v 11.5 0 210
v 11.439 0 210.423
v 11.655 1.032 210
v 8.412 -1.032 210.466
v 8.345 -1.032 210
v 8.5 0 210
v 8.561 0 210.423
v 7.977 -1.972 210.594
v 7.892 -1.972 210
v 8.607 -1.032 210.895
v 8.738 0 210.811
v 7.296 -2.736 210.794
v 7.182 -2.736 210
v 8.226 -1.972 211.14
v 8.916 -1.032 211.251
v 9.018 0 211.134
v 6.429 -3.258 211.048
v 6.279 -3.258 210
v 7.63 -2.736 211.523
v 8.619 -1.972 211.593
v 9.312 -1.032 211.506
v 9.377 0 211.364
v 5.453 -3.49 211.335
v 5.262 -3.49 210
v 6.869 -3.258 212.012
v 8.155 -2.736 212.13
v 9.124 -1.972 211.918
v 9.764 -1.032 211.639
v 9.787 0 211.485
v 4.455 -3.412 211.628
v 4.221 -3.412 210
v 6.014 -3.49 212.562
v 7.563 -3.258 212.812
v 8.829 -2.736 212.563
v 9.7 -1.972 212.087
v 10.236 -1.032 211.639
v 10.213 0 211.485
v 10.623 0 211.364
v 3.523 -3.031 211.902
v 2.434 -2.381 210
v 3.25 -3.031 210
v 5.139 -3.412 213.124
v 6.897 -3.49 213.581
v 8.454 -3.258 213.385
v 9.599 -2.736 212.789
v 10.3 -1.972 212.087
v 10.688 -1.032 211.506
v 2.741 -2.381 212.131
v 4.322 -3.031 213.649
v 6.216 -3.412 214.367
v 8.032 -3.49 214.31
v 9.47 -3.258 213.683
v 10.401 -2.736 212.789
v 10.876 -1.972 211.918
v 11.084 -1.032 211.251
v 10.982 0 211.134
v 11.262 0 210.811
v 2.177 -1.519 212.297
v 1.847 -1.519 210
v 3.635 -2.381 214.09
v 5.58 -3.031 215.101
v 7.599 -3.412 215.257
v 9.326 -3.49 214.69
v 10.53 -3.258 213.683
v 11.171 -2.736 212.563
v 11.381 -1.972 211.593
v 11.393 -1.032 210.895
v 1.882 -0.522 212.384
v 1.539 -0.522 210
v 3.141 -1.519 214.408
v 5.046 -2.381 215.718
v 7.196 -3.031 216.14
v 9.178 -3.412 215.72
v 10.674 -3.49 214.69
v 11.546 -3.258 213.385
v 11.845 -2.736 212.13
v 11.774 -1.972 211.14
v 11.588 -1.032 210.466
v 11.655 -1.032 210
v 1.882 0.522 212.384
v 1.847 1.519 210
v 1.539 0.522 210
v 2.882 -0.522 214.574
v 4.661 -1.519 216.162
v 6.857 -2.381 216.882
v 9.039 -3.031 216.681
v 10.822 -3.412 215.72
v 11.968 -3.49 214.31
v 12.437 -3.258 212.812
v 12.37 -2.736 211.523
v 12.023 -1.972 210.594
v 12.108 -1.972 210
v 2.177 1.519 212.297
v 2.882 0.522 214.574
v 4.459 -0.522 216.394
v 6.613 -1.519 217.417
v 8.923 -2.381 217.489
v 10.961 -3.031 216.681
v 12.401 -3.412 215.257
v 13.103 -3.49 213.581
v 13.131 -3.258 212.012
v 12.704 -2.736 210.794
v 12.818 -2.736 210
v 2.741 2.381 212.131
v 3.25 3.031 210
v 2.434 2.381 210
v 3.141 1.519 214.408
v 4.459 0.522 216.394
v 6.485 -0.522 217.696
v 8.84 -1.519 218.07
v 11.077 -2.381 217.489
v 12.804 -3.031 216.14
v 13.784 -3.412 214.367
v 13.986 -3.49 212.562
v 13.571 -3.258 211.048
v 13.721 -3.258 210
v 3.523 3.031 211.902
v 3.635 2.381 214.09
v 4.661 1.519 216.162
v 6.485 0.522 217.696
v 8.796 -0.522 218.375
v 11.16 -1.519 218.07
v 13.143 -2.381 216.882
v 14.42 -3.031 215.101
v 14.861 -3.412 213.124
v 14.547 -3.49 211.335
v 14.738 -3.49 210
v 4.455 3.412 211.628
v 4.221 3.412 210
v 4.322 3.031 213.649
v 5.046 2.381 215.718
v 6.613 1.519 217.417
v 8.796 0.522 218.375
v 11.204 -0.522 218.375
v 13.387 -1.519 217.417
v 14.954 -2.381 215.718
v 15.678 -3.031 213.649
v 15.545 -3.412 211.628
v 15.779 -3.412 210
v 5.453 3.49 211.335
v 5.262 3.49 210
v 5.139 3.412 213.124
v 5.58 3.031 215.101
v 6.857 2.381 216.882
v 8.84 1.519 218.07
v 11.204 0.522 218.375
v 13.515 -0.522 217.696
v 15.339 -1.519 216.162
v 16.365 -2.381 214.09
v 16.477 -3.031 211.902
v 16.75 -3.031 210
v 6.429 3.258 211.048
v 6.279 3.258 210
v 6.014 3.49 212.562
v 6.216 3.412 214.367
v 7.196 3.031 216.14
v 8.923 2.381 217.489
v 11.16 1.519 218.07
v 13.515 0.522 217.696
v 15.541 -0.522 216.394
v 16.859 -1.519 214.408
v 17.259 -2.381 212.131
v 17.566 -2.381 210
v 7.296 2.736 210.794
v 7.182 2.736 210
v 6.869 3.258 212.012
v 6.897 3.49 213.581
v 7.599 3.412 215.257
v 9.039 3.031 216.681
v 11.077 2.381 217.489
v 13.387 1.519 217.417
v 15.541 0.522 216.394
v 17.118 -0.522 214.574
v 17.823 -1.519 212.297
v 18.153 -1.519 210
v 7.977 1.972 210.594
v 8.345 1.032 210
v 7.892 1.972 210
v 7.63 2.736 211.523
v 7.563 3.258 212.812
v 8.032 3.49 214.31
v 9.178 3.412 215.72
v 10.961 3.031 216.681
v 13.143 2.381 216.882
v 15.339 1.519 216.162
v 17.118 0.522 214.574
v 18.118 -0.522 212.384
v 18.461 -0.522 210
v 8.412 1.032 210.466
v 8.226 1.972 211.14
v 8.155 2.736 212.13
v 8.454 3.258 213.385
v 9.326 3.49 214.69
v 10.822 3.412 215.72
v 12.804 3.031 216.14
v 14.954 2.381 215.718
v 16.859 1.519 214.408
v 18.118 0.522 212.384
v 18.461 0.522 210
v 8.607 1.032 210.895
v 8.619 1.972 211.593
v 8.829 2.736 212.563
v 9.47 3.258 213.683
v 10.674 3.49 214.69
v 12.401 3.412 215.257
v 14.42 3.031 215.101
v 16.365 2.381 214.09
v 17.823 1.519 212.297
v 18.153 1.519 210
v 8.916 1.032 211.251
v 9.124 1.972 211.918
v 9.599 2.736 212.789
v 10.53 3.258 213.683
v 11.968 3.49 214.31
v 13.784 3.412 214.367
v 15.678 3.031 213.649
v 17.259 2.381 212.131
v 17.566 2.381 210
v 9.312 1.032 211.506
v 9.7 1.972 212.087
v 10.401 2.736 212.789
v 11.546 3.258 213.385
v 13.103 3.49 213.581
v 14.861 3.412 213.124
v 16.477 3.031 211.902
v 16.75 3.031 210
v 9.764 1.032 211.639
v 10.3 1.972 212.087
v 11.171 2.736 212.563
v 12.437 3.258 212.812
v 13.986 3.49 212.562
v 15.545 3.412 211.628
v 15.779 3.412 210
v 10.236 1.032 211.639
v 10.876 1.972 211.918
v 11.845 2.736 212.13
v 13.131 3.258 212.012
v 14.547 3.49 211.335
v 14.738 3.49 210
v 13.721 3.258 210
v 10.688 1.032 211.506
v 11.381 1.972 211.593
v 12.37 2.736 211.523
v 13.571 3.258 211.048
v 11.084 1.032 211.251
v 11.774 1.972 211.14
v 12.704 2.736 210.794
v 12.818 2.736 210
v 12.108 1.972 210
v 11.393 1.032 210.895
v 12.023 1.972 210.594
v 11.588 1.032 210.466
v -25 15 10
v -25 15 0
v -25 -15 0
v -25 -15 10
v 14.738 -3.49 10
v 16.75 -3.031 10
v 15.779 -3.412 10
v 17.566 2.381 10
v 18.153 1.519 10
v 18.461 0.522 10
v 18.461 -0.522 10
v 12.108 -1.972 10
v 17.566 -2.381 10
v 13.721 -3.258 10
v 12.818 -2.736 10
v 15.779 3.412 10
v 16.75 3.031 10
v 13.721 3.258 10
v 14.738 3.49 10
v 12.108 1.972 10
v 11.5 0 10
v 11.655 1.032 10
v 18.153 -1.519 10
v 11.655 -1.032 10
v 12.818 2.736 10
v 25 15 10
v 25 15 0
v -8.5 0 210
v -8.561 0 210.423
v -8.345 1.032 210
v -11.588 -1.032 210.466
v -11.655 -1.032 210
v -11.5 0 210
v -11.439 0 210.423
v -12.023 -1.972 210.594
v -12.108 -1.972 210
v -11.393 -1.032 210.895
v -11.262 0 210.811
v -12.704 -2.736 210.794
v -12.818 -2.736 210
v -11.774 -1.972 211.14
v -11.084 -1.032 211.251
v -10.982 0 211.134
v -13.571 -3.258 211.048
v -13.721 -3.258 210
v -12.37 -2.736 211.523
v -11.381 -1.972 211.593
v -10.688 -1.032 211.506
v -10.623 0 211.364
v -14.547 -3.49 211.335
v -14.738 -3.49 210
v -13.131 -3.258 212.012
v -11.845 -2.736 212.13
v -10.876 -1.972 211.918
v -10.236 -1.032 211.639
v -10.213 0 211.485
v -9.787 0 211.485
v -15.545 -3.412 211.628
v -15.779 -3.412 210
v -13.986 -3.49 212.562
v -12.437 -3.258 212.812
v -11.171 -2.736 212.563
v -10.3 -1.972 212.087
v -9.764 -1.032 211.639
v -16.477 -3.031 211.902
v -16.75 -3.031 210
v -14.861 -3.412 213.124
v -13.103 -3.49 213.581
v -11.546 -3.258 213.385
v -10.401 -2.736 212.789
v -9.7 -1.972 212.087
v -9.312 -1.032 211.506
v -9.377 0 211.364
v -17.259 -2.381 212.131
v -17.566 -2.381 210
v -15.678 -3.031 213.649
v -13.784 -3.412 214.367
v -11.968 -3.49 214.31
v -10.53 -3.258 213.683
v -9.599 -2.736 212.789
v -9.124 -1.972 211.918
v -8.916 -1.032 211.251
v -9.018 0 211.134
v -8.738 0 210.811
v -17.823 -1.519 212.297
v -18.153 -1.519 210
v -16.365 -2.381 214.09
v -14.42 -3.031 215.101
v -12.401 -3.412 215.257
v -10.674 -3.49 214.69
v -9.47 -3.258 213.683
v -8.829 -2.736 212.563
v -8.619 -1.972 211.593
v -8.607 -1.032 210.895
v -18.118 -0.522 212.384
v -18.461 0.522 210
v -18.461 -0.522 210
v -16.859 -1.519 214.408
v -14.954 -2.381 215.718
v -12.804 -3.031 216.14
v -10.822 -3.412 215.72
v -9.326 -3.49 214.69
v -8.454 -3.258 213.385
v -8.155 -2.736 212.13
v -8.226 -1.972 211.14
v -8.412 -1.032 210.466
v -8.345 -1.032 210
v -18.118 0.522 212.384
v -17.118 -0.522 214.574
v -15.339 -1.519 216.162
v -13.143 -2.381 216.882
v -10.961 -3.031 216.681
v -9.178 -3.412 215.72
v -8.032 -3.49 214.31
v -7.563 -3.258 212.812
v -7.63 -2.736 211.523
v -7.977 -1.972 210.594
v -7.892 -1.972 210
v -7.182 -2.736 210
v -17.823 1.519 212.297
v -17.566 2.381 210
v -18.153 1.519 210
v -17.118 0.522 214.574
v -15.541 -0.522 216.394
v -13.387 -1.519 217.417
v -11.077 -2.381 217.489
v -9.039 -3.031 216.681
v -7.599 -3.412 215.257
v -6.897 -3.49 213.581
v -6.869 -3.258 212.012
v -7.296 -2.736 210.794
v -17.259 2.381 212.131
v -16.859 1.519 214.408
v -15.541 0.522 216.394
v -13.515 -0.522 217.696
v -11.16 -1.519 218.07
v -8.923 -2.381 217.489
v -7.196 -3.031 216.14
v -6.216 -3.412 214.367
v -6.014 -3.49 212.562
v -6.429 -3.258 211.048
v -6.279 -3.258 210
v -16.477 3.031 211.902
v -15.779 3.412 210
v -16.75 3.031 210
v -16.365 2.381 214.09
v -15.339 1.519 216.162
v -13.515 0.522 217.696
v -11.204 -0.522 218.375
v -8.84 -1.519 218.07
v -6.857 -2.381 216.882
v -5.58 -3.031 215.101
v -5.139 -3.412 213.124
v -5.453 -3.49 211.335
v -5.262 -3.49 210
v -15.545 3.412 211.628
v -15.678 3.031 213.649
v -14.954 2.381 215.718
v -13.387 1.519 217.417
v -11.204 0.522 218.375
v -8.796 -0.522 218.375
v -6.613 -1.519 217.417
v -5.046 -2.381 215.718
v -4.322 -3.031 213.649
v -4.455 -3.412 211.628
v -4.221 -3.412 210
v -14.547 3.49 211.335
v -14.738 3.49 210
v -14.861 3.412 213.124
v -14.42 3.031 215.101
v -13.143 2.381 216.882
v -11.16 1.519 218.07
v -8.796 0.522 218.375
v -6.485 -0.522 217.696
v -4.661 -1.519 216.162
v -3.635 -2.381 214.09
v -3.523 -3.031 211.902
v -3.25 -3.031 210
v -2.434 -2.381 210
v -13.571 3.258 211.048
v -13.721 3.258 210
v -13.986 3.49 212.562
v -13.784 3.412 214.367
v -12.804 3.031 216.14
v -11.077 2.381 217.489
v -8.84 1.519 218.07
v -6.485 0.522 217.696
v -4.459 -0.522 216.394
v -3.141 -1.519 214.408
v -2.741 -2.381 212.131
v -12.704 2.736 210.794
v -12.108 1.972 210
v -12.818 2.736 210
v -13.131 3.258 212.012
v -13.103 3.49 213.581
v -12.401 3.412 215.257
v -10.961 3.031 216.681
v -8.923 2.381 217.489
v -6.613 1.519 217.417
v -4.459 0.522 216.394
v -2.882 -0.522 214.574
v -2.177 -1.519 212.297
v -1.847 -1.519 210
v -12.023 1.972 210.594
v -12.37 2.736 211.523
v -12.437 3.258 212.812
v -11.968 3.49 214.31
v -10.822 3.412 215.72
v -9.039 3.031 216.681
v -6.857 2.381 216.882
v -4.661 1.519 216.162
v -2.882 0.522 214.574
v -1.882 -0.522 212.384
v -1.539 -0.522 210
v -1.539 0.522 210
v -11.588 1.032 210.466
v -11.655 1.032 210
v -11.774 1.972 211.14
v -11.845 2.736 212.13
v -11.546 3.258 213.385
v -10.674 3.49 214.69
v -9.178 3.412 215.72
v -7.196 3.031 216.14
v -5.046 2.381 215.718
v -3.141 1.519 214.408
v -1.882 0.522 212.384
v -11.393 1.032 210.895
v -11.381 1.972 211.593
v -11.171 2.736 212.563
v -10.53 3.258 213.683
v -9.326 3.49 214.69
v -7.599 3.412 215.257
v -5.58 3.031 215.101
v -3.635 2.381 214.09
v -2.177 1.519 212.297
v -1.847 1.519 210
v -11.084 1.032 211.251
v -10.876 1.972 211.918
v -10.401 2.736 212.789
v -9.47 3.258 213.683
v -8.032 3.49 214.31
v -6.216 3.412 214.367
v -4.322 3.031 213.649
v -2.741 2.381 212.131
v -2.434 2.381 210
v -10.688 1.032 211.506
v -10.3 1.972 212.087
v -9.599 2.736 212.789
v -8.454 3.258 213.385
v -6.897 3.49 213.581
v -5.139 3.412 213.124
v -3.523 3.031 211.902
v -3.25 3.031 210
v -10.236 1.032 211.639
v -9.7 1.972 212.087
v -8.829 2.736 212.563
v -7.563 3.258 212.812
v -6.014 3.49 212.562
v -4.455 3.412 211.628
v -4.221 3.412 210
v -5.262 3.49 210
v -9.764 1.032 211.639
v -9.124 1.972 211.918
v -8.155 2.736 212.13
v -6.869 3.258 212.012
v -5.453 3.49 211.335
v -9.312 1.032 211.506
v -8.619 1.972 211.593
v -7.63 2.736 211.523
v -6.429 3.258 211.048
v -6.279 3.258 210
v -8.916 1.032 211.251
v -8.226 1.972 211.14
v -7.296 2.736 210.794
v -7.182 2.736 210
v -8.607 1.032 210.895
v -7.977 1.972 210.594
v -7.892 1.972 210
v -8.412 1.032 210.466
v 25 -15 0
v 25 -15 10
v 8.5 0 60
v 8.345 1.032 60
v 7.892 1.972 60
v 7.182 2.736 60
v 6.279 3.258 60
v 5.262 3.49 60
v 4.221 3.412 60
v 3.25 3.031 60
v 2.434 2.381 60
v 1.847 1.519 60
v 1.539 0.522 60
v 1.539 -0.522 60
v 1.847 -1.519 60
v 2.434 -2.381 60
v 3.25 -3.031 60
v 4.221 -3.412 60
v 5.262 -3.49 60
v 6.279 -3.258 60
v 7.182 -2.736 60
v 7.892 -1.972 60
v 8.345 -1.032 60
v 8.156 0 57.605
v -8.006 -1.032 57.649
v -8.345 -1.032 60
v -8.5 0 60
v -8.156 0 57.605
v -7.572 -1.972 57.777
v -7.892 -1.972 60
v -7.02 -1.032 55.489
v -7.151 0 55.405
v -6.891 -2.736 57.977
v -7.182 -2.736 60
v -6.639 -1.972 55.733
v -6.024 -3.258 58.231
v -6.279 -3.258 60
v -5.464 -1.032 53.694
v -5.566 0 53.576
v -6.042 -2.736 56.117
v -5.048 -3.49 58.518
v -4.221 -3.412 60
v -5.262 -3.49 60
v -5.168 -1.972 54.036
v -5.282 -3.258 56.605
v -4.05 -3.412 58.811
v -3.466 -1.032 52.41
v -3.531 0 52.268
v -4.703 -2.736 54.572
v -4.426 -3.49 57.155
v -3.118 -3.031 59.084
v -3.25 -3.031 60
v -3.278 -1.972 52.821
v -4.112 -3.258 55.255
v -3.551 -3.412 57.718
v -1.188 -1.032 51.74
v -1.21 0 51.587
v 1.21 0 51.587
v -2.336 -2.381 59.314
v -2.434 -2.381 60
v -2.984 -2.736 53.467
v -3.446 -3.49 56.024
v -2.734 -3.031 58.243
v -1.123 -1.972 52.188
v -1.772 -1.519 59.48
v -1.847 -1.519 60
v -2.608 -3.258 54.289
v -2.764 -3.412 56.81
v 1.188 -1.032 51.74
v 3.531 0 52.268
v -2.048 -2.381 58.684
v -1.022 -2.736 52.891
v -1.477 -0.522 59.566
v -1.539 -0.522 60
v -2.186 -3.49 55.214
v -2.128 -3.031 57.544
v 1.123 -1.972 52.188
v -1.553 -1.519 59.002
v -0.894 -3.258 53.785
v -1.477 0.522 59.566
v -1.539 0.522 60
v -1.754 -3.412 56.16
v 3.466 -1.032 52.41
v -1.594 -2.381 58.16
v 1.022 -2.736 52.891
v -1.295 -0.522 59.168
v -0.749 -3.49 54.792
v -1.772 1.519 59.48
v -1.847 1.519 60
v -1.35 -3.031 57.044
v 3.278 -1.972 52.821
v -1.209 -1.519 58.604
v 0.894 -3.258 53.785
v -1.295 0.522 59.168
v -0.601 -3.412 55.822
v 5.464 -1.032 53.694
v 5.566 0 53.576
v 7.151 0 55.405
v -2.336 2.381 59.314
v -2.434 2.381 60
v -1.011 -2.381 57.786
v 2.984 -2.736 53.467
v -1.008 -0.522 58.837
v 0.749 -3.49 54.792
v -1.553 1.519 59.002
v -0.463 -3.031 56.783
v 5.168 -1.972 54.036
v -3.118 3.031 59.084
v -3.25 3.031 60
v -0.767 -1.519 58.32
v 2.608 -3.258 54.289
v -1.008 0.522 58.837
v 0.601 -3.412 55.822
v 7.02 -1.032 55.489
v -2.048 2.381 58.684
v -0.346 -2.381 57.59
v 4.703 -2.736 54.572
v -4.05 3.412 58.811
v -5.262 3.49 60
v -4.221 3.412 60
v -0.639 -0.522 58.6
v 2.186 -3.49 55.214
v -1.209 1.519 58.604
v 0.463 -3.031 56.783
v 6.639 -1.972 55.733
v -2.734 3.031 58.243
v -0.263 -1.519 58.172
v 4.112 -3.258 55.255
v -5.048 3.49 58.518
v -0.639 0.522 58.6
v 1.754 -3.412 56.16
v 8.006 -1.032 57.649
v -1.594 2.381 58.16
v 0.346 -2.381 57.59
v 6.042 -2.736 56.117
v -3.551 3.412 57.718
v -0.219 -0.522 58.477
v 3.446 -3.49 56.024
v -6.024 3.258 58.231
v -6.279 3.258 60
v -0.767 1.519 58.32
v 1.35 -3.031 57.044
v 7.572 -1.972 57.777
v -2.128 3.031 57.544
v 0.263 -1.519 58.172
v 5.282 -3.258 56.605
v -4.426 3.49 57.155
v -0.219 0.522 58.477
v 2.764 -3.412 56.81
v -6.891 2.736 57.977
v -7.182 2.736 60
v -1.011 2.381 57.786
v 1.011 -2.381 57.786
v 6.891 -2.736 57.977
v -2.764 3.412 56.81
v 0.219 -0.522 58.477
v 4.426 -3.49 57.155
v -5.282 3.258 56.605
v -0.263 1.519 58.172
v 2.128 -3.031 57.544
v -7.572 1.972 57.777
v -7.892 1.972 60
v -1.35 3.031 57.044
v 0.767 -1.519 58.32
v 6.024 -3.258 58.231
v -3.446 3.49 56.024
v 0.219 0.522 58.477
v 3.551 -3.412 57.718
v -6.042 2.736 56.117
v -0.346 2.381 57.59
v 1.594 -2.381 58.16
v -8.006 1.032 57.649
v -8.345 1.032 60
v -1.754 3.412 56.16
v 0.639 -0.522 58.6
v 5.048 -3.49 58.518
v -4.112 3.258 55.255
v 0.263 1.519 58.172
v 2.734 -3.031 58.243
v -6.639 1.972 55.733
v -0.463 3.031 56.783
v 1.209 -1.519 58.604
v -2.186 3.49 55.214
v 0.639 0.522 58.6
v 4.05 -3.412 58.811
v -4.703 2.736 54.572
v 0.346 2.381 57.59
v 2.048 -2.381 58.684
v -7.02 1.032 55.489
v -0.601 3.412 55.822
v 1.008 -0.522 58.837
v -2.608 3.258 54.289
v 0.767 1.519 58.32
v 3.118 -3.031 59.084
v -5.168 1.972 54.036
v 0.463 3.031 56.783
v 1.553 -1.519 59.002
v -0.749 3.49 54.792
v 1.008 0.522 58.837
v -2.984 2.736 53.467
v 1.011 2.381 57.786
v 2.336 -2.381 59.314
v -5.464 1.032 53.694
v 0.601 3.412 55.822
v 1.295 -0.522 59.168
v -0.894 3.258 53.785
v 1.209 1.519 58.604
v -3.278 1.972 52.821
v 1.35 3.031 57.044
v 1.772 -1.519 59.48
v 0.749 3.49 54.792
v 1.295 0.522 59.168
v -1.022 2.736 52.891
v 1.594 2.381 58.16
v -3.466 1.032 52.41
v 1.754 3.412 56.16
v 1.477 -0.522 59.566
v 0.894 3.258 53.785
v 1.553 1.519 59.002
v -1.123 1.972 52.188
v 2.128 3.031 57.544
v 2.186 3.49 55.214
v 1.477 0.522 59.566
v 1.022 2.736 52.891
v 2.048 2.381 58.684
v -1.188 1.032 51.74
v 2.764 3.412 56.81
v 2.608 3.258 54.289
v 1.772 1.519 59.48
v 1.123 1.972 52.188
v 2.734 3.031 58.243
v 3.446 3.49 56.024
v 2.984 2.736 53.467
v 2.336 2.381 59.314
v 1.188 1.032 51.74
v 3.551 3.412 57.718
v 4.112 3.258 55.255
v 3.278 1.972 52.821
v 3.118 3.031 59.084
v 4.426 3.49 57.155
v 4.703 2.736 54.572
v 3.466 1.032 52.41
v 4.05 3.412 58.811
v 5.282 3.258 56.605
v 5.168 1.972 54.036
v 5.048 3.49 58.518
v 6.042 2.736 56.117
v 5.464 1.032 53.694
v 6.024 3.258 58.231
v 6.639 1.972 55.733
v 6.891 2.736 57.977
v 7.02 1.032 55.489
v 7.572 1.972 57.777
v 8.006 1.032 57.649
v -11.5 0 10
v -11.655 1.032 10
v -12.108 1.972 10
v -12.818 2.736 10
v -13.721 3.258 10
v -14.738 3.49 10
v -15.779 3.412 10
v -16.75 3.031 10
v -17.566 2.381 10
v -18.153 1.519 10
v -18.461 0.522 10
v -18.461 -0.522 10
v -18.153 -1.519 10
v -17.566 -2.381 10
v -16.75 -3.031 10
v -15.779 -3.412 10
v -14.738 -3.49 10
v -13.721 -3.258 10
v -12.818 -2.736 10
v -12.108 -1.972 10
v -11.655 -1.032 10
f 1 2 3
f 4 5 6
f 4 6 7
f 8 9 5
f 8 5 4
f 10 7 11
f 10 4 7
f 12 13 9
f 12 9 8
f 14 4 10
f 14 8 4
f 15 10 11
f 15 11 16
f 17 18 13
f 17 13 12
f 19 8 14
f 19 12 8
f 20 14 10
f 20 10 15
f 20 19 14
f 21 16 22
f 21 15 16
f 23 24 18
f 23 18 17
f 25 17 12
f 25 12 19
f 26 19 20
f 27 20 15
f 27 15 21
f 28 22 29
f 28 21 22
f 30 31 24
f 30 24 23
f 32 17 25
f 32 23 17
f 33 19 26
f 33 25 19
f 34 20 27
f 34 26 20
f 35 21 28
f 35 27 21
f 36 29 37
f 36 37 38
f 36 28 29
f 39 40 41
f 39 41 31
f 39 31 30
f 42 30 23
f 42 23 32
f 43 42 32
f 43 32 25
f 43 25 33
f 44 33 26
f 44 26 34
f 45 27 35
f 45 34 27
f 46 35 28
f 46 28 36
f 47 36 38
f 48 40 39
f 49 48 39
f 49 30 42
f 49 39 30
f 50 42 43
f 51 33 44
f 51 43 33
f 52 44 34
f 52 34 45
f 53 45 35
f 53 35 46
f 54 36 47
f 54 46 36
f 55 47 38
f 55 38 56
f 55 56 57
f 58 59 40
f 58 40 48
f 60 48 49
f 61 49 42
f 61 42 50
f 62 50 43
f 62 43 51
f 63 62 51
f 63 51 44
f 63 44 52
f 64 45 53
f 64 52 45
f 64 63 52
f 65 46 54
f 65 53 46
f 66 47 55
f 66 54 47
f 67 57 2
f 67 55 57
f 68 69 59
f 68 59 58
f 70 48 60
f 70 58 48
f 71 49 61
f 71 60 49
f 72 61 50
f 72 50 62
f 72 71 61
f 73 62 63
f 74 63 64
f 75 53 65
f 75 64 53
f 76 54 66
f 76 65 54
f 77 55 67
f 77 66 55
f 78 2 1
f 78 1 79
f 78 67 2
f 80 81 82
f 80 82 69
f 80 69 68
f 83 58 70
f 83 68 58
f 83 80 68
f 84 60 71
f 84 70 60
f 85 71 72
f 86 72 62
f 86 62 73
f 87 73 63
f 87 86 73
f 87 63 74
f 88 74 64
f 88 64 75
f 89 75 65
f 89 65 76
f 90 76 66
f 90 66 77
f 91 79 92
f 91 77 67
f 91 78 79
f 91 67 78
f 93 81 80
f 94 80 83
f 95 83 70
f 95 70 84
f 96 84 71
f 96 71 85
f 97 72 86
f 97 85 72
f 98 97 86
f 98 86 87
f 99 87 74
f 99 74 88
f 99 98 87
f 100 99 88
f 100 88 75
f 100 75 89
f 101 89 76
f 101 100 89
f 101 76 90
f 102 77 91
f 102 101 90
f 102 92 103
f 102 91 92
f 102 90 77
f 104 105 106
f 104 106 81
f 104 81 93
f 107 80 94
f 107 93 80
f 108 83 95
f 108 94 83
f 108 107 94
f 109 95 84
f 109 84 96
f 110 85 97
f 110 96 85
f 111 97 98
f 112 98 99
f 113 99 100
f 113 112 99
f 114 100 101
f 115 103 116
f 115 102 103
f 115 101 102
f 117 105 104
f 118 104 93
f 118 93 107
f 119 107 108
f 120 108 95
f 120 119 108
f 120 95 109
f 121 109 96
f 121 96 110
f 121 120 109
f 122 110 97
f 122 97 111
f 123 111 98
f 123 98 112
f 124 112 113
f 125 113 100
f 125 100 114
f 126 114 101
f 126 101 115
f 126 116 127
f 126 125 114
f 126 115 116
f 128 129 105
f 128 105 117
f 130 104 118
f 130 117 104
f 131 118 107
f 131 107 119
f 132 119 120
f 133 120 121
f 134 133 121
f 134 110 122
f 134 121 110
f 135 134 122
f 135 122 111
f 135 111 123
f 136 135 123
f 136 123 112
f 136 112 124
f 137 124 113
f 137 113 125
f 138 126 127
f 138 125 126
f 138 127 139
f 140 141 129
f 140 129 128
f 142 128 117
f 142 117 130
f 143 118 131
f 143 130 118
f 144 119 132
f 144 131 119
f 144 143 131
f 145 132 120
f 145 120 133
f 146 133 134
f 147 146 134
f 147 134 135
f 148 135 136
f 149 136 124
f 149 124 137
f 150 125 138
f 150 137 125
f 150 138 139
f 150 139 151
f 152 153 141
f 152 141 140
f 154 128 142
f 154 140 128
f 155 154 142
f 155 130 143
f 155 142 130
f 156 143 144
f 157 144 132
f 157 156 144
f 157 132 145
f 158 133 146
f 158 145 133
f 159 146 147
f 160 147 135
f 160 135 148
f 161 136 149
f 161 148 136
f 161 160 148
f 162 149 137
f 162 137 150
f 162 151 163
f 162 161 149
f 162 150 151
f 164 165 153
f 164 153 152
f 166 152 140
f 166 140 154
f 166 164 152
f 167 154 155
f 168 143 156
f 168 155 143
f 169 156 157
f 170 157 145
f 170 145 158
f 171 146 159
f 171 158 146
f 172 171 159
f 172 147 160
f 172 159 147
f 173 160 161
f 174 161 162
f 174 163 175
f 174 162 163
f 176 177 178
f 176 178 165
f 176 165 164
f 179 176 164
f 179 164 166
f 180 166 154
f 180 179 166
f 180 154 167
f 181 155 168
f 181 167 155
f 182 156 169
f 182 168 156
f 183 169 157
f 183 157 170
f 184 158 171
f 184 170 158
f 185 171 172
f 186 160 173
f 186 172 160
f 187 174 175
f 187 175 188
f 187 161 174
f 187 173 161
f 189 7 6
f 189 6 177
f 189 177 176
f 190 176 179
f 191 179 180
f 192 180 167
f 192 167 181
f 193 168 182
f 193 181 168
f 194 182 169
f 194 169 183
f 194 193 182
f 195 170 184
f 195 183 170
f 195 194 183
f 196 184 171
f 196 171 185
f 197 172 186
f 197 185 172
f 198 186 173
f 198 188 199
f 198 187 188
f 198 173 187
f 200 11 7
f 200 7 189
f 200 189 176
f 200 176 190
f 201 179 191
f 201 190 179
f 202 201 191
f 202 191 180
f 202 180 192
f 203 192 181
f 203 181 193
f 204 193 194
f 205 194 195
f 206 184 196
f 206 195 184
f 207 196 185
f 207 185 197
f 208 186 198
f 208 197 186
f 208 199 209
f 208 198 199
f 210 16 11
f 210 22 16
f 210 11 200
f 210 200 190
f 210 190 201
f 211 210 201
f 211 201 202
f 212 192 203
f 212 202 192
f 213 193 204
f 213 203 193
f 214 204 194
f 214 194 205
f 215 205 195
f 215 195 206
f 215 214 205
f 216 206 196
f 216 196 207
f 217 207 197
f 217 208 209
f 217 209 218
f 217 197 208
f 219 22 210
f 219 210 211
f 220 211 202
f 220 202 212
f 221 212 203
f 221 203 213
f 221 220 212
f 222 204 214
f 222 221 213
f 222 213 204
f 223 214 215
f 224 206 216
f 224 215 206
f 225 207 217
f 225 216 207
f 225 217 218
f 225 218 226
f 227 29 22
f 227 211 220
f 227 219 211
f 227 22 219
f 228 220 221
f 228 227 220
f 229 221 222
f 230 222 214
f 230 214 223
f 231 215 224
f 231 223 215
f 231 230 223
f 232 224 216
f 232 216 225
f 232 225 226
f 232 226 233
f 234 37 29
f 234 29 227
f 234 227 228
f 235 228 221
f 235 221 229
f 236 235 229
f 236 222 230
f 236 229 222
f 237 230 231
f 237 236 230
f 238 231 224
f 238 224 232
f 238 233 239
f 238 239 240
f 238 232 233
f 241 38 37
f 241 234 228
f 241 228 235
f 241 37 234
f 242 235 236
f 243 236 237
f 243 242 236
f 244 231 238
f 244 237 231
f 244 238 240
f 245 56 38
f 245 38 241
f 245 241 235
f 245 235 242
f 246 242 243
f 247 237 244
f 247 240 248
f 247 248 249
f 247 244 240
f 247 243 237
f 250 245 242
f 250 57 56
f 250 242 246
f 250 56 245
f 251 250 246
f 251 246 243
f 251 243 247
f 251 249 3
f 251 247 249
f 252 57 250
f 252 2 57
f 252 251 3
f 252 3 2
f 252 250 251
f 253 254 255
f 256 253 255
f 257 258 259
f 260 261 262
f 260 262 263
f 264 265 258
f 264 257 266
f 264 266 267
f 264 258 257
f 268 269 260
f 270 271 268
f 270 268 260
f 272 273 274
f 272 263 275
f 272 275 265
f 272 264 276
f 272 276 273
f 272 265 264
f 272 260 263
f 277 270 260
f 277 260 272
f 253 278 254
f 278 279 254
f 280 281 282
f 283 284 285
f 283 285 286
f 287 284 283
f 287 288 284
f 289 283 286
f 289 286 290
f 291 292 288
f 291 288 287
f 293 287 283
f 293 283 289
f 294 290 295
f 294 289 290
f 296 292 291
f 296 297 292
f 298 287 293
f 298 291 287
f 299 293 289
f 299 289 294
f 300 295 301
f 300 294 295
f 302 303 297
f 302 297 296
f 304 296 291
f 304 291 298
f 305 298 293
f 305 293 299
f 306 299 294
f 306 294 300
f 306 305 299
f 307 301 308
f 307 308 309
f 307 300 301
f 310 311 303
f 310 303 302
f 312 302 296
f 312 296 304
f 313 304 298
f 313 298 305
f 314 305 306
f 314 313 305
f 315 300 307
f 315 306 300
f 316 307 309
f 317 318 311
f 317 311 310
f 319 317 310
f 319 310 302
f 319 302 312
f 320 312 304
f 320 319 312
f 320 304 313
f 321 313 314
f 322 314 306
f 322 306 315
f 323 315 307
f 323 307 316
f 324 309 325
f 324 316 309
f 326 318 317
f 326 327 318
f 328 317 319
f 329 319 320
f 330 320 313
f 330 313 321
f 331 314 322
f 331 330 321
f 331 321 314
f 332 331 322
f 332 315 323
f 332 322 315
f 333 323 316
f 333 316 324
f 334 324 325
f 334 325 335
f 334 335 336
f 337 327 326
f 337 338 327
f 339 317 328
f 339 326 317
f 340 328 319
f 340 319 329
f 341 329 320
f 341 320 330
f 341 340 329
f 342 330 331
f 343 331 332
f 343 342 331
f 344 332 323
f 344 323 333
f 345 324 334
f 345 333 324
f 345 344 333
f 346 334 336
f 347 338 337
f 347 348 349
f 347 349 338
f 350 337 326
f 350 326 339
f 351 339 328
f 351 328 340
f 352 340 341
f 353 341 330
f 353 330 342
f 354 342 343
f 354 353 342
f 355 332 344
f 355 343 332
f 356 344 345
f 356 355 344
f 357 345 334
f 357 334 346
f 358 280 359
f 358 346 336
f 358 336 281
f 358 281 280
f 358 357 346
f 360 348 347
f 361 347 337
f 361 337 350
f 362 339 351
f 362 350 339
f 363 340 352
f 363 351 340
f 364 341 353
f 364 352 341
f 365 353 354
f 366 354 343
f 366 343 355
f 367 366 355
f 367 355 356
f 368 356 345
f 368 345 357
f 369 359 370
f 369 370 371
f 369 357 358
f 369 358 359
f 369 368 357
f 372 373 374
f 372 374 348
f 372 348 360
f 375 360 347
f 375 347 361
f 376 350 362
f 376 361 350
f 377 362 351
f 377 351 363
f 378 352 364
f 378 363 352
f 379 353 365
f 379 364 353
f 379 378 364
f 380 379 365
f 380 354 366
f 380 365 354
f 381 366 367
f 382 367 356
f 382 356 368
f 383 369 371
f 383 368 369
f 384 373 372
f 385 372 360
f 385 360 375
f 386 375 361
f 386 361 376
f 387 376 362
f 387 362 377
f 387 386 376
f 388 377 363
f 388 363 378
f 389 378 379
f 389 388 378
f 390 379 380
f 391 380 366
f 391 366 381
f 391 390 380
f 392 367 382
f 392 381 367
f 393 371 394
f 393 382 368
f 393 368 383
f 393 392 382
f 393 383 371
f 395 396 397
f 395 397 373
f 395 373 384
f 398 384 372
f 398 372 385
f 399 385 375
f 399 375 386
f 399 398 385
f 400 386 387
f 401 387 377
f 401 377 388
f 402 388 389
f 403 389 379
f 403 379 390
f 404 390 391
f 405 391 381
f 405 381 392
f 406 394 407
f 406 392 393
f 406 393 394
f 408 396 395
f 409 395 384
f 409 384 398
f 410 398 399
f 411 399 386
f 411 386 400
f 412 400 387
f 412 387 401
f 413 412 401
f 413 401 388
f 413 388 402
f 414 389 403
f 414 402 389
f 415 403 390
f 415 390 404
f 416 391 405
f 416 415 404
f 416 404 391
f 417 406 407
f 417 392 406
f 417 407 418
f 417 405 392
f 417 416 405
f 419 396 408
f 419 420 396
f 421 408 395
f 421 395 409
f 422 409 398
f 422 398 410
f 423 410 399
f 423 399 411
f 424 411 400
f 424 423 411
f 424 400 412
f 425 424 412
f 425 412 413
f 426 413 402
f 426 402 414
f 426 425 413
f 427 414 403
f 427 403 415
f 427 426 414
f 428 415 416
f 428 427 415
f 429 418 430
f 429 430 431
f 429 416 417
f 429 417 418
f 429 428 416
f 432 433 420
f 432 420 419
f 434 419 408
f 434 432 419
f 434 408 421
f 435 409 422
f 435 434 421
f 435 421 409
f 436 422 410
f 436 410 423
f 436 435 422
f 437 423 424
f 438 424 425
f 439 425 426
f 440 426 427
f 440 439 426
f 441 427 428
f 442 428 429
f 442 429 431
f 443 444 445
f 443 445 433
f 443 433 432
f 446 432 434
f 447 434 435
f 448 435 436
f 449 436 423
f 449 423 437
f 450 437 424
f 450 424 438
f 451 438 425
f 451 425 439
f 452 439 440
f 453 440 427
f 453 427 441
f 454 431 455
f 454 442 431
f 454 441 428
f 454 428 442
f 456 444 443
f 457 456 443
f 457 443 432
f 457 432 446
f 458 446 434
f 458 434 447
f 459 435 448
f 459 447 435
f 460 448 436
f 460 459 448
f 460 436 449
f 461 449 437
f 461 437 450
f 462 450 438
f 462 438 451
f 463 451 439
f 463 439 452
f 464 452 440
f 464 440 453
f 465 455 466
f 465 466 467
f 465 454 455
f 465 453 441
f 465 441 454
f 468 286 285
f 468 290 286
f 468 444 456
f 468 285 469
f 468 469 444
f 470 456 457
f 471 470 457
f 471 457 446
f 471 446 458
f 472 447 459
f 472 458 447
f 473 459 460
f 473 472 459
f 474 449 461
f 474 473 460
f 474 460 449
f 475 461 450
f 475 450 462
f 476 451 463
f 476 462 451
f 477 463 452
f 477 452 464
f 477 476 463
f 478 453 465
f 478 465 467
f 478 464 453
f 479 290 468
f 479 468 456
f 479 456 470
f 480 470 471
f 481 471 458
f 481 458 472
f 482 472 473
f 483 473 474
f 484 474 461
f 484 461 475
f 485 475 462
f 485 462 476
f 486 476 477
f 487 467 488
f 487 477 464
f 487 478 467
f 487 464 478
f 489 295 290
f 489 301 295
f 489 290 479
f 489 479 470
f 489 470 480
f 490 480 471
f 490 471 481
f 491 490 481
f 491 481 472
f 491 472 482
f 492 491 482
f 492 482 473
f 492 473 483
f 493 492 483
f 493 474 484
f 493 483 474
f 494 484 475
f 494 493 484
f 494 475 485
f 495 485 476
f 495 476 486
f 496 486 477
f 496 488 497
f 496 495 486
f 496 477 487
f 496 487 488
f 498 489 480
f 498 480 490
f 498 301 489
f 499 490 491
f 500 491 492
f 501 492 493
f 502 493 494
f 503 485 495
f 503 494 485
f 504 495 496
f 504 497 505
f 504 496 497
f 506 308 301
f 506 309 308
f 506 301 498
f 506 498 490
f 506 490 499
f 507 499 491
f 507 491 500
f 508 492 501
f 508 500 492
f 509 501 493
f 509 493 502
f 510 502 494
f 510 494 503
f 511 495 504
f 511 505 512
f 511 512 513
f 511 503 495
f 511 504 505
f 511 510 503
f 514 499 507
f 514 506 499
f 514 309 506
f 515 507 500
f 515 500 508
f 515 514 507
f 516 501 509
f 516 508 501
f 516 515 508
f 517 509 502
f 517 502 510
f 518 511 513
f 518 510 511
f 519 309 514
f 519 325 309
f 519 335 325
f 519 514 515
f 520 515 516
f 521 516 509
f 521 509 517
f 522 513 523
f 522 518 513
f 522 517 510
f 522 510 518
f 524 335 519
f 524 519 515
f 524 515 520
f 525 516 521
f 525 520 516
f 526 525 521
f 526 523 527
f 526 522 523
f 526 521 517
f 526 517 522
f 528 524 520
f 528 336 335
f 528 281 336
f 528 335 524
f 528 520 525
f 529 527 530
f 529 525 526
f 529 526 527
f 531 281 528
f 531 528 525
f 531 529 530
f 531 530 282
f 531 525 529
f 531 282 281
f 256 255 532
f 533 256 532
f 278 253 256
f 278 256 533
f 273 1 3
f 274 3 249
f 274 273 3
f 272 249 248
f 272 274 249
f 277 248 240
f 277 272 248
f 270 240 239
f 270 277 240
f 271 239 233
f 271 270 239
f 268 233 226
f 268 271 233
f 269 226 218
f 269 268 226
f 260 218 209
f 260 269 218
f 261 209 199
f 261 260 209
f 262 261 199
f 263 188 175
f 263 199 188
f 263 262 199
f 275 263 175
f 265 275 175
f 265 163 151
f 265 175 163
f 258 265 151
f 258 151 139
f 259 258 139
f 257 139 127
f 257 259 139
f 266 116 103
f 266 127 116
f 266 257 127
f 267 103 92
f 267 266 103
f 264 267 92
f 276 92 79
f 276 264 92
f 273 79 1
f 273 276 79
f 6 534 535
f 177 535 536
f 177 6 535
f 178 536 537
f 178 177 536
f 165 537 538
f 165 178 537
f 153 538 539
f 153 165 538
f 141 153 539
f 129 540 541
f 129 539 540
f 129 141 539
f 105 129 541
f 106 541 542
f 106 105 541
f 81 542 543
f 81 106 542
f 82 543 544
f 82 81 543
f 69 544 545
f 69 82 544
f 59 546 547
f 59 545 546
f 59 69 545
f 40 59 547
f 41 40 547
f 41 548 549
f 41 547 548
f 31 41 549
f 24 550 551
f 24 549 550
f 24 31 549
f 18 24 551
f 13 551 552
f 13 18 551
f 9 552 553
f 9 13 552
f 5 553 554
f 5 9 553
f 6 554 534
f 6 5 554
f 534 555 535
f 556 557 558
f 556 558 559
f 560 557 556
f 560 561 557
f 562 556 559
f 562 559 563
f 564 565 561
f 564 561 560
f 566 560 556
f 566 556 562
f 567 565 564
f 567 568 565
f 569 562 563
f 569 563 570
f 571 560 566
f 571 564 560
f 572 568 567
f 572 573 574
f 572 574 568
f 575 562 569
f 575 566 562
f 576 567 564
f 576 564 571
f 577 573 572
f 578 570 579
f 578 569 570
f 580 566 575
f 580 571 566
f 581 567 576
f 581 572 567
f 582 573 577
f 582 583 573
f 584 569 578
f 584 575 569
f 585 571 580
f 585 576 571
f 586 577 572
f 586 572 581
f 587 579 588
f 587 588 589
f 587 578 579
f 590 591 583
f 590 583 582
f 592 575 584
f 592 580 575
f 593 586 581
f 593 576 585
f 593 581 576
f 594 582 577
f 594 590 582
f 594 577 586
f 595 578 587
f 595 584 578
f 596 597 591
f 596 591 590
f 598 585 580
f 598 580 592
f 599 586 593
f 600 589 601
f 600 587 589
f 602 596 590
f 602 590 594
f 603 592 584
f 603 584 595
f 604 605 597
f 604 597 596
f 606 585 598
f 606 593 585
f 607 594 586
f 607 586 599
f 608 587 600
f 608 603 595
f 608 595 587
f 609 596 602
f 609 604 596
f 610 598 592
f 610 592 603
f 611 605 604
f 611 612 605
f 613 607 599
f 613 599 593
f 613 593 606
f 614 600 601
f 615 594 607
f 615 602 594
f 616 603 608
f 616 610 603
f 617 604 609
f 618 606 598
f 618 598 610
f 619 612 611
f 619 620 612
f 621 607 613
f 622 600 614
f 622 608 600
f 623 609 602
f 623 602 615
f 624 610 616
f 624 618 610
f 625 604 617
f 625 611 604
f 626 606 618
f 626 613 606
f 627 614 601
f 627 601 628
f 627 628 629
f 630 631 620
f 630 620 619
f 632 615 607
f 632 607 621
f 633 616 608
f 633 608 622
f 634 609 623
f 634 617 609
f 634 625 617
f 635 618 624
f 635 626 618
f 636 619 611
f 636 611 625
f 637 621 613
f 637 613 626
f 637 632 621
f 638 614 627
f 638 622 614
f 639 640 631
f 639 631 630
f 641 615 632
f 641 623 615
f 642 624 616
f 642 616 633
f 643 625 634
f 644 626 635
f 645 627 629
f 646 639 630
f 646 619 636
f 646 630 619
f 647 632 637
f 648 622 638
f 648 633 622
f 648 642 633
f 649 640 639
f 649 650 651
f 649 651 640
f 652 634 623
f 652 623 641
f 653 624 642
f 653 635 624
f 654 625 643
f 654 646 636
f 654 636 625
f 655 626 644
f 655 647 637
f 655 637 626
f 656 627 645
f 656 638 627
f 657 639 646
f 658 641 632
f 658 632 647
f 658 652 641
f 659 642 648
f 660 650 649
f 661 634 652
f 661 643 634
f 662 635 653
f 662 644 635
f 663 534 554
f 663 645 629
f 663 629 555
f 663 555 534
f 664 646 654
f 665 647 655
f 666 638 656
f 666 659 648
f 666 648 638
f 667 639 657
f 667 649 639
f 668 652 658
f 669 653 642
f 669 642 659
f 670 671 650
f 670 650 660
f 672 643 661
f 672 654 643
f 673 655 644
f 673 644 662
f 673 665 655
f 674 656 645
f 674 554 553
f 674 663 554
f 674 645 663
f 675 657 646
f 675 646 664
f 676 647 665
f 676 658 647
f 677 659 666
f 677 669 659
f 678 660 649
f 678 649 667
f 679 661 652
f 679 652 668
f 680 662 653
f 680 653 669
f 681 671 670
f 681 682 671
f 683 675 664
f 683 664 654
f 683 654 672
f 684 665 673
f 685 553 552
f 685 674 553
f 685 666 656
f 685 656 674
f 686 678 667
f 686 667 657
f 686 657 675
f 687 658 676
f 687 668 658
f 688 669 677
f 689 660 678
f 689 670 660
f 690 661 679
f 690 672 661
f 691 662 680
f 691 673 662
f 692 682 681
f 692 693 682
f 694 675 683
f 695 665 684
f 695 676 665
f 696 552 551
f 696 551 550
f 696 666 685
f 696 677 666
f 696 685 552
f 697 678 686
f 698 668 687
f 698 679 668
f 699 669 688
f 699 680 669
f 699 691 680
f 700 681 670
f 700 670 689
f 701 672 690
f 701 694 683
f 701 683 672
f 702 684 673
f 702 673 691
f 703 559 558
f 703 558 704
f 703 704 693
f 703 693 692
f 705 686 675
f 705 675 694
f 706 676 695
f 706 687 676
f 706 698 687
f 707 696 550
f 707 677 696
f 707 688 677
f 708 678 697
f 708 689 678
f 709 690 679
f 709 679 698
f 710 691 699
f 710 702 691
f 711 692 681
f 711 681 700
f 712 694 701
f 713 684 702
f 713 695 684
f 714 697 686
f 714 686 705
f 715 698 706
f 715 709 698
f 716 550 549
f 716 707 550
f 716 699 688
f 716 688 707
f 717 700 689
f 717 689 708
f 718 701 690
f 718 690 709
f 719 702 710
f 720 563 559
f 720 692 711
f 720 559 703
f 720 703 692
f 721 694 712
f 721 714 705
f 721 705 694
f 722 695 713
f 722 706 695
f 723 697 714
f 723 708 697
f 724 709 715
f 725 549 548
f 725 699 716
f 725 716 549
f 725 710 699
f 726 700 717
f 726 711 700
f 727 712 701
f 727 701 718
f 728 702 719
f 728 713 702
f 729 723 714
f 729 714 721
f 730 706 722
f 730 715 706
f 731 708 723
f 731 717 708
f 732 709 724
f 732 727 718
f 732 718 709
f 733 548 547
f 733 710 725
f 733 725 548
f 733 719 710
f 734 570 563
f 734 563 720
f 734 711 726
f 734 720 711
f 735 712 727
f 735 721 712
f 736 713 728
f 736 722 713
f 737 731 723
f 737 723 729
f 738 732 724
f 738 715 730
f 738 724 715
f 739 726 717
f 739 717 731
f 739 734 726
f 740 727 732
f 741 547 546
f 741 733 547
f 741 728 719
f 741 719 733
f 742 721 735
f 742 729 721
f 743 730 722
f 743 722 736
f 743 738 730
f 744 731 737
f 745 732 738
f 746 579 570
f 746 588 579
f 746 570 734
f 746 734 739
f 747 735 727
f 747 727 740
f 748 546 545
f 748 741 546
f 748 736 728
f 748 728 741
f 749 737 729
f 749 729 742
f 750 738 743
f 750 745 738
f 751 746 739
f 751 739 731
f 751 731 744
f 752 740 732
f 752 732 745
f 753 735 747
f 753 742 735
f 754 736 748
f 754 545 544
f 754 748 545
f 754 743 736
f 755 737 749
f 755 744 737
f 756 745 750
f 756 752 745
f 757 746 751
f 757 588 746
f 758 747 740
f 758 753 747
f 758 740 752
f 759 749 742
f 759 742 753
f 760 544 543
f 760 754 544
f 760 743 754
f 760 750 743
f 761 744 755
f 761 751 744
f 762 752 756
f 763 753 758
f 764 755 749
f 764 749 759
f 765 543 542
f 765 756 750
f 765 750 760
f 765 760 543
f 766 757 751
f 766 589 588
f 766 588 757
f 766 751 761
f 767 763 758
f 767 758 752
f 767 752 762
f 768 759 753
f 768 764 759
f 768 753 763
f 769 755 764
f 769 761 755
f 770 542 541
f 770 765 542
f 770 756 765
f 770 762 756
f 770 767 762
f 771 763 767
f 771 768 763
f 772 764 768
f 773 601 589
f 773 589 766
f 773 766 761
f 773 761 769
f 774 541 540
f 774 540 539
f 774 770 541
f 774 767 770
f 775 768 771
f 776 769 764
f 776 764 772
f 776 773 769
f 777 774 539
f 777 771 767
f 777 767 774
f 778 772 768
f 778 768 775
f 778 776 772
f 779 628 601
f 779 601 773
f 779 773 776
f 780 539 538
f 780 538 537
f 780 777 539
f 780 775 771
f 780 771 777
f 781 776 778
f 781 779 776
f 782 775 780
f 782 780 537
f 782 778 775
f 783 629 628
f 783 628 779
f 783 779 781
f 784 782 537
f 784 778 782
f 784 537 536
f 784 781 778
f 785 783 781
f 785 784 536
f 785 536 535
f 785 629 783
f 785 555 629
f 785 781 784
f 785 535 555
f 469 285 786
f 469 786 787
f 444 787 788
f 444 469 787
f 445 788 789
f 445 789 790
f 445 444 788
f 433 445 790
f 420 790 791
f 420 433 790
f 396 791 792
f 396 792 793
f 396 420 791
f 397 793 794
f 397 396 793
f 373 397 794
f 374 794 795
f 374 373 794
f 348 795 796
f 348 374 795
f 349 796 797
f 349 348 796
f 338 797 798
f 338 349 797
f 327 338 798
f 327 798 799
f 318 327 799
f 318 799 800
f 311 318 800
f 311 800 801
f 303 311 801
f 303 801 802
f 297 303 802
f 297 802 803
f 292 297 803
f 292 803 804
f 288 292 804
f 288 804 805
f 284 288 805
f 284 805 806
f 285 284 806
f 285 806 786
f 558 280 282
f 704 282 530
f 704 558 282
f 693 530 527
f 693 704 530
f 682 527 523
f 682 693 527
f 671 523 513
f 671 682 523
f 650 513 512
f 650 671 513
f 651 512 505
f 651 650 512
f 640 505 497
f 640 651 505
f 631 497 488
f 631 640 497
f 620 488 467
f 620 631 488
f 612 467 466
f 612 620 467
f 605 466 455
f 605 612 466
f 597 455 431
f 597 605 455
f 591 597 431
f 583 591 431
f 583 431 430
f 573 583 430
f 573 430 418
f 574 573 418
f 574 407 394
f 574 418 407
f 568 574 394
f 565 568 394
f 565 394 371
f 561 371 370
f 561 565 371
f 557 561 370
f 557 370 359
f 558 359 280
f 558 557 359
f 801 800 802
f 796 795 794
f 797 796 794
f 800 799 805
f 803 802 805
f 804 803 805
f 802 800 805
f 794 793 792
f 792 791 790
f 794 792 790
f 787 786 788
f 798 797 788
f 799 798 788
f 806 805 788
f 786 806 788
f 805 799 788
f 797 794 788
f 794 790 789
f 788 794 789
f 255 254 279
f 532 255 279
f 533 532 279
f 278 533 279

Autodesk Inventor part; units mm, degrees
ref_plane "YZ Plane" through (0, 0, 0) normal (1, 0, 0) x (0, 1, 0)
ref_plane "XZ Plane" through (0, 0, 0) normal (0, 1, 0) x (-1, 0, 0)
ref_plane "XY Plane" through (0, 0, 0) normal (0, 0, 1) x (1, 0, 0)
sketch "Skizze1" plane through (0, 0, 0) normal (0, 0, 1) x (1, 0, 0)
  line L0 (-25, -15) -> (25, -15)
  line L1 (25, -15) -> (25, 15)
  line L2 (25, 15) -> (-25, 15)
  line L3 (-25, 15) -> (-25, -15)
  line L4 (-25, -15) -> (25, 15) construction
  line L5 (25, -15) -> (-25, 15) construction
  point P0 (0, 0)
  dimension "d0" = 50
  dimension "d1" = 30
extrude "Extrusion1" add sketch "Skizze1" along normal blind 10
sketch "Skizze2" plane through (0, 0, 10) normal (0, 0, 1) x (1, 0, 0)
  circle A0 centre (-15, 0) radius 3.5
  circle A1 centre (15, 0) radius 3.5
  line L0 (0, -21) -> (0, 21) projected
  point P0 (0, 0)
  dimension "d4" = 7
  dimension "d5" = 7
  dimension "d6" = 30
sketch "Skizze3" plane through (0, 0, 0) normal (0, 1, 0) x (-1, 0, 0)
  line L0 (-25, 10) -> (25, 10) projected
  line L1 (-15, 10) -> (-15, 210)
  line L2 (15, 10) -> (15, 210)
  line L3 (5, 210) -> (5, 60)
  line L4 (-5, 60) -> (-5, 210)
  arc A0 (-5, 210) -> (-15, 210) centre (-10, 210) ccw
  arc A1 (15, 210) -> (5, 210) centre (10, 210) ccw
  arc A2 (-5, 60) -> (5, 60) centre (0, 60) ccw
  point P0 (0, 0)
  dimension "d7" = 30
  dimension "d8" = 15
  dimension "d9" = 200
  dimension "d10" = 200
  dimension "d11" = 150
  dimension "d12" = 10
  dimension "d13" = 10
sweep "Sweeping1" add profiles "Skizze2" path "Skizze3" separate body path curves L2 A1 L3 A2 L4 A0 L1 contours A0
equation "\"d10\" = d9"
properties part number "Heizwendel"
